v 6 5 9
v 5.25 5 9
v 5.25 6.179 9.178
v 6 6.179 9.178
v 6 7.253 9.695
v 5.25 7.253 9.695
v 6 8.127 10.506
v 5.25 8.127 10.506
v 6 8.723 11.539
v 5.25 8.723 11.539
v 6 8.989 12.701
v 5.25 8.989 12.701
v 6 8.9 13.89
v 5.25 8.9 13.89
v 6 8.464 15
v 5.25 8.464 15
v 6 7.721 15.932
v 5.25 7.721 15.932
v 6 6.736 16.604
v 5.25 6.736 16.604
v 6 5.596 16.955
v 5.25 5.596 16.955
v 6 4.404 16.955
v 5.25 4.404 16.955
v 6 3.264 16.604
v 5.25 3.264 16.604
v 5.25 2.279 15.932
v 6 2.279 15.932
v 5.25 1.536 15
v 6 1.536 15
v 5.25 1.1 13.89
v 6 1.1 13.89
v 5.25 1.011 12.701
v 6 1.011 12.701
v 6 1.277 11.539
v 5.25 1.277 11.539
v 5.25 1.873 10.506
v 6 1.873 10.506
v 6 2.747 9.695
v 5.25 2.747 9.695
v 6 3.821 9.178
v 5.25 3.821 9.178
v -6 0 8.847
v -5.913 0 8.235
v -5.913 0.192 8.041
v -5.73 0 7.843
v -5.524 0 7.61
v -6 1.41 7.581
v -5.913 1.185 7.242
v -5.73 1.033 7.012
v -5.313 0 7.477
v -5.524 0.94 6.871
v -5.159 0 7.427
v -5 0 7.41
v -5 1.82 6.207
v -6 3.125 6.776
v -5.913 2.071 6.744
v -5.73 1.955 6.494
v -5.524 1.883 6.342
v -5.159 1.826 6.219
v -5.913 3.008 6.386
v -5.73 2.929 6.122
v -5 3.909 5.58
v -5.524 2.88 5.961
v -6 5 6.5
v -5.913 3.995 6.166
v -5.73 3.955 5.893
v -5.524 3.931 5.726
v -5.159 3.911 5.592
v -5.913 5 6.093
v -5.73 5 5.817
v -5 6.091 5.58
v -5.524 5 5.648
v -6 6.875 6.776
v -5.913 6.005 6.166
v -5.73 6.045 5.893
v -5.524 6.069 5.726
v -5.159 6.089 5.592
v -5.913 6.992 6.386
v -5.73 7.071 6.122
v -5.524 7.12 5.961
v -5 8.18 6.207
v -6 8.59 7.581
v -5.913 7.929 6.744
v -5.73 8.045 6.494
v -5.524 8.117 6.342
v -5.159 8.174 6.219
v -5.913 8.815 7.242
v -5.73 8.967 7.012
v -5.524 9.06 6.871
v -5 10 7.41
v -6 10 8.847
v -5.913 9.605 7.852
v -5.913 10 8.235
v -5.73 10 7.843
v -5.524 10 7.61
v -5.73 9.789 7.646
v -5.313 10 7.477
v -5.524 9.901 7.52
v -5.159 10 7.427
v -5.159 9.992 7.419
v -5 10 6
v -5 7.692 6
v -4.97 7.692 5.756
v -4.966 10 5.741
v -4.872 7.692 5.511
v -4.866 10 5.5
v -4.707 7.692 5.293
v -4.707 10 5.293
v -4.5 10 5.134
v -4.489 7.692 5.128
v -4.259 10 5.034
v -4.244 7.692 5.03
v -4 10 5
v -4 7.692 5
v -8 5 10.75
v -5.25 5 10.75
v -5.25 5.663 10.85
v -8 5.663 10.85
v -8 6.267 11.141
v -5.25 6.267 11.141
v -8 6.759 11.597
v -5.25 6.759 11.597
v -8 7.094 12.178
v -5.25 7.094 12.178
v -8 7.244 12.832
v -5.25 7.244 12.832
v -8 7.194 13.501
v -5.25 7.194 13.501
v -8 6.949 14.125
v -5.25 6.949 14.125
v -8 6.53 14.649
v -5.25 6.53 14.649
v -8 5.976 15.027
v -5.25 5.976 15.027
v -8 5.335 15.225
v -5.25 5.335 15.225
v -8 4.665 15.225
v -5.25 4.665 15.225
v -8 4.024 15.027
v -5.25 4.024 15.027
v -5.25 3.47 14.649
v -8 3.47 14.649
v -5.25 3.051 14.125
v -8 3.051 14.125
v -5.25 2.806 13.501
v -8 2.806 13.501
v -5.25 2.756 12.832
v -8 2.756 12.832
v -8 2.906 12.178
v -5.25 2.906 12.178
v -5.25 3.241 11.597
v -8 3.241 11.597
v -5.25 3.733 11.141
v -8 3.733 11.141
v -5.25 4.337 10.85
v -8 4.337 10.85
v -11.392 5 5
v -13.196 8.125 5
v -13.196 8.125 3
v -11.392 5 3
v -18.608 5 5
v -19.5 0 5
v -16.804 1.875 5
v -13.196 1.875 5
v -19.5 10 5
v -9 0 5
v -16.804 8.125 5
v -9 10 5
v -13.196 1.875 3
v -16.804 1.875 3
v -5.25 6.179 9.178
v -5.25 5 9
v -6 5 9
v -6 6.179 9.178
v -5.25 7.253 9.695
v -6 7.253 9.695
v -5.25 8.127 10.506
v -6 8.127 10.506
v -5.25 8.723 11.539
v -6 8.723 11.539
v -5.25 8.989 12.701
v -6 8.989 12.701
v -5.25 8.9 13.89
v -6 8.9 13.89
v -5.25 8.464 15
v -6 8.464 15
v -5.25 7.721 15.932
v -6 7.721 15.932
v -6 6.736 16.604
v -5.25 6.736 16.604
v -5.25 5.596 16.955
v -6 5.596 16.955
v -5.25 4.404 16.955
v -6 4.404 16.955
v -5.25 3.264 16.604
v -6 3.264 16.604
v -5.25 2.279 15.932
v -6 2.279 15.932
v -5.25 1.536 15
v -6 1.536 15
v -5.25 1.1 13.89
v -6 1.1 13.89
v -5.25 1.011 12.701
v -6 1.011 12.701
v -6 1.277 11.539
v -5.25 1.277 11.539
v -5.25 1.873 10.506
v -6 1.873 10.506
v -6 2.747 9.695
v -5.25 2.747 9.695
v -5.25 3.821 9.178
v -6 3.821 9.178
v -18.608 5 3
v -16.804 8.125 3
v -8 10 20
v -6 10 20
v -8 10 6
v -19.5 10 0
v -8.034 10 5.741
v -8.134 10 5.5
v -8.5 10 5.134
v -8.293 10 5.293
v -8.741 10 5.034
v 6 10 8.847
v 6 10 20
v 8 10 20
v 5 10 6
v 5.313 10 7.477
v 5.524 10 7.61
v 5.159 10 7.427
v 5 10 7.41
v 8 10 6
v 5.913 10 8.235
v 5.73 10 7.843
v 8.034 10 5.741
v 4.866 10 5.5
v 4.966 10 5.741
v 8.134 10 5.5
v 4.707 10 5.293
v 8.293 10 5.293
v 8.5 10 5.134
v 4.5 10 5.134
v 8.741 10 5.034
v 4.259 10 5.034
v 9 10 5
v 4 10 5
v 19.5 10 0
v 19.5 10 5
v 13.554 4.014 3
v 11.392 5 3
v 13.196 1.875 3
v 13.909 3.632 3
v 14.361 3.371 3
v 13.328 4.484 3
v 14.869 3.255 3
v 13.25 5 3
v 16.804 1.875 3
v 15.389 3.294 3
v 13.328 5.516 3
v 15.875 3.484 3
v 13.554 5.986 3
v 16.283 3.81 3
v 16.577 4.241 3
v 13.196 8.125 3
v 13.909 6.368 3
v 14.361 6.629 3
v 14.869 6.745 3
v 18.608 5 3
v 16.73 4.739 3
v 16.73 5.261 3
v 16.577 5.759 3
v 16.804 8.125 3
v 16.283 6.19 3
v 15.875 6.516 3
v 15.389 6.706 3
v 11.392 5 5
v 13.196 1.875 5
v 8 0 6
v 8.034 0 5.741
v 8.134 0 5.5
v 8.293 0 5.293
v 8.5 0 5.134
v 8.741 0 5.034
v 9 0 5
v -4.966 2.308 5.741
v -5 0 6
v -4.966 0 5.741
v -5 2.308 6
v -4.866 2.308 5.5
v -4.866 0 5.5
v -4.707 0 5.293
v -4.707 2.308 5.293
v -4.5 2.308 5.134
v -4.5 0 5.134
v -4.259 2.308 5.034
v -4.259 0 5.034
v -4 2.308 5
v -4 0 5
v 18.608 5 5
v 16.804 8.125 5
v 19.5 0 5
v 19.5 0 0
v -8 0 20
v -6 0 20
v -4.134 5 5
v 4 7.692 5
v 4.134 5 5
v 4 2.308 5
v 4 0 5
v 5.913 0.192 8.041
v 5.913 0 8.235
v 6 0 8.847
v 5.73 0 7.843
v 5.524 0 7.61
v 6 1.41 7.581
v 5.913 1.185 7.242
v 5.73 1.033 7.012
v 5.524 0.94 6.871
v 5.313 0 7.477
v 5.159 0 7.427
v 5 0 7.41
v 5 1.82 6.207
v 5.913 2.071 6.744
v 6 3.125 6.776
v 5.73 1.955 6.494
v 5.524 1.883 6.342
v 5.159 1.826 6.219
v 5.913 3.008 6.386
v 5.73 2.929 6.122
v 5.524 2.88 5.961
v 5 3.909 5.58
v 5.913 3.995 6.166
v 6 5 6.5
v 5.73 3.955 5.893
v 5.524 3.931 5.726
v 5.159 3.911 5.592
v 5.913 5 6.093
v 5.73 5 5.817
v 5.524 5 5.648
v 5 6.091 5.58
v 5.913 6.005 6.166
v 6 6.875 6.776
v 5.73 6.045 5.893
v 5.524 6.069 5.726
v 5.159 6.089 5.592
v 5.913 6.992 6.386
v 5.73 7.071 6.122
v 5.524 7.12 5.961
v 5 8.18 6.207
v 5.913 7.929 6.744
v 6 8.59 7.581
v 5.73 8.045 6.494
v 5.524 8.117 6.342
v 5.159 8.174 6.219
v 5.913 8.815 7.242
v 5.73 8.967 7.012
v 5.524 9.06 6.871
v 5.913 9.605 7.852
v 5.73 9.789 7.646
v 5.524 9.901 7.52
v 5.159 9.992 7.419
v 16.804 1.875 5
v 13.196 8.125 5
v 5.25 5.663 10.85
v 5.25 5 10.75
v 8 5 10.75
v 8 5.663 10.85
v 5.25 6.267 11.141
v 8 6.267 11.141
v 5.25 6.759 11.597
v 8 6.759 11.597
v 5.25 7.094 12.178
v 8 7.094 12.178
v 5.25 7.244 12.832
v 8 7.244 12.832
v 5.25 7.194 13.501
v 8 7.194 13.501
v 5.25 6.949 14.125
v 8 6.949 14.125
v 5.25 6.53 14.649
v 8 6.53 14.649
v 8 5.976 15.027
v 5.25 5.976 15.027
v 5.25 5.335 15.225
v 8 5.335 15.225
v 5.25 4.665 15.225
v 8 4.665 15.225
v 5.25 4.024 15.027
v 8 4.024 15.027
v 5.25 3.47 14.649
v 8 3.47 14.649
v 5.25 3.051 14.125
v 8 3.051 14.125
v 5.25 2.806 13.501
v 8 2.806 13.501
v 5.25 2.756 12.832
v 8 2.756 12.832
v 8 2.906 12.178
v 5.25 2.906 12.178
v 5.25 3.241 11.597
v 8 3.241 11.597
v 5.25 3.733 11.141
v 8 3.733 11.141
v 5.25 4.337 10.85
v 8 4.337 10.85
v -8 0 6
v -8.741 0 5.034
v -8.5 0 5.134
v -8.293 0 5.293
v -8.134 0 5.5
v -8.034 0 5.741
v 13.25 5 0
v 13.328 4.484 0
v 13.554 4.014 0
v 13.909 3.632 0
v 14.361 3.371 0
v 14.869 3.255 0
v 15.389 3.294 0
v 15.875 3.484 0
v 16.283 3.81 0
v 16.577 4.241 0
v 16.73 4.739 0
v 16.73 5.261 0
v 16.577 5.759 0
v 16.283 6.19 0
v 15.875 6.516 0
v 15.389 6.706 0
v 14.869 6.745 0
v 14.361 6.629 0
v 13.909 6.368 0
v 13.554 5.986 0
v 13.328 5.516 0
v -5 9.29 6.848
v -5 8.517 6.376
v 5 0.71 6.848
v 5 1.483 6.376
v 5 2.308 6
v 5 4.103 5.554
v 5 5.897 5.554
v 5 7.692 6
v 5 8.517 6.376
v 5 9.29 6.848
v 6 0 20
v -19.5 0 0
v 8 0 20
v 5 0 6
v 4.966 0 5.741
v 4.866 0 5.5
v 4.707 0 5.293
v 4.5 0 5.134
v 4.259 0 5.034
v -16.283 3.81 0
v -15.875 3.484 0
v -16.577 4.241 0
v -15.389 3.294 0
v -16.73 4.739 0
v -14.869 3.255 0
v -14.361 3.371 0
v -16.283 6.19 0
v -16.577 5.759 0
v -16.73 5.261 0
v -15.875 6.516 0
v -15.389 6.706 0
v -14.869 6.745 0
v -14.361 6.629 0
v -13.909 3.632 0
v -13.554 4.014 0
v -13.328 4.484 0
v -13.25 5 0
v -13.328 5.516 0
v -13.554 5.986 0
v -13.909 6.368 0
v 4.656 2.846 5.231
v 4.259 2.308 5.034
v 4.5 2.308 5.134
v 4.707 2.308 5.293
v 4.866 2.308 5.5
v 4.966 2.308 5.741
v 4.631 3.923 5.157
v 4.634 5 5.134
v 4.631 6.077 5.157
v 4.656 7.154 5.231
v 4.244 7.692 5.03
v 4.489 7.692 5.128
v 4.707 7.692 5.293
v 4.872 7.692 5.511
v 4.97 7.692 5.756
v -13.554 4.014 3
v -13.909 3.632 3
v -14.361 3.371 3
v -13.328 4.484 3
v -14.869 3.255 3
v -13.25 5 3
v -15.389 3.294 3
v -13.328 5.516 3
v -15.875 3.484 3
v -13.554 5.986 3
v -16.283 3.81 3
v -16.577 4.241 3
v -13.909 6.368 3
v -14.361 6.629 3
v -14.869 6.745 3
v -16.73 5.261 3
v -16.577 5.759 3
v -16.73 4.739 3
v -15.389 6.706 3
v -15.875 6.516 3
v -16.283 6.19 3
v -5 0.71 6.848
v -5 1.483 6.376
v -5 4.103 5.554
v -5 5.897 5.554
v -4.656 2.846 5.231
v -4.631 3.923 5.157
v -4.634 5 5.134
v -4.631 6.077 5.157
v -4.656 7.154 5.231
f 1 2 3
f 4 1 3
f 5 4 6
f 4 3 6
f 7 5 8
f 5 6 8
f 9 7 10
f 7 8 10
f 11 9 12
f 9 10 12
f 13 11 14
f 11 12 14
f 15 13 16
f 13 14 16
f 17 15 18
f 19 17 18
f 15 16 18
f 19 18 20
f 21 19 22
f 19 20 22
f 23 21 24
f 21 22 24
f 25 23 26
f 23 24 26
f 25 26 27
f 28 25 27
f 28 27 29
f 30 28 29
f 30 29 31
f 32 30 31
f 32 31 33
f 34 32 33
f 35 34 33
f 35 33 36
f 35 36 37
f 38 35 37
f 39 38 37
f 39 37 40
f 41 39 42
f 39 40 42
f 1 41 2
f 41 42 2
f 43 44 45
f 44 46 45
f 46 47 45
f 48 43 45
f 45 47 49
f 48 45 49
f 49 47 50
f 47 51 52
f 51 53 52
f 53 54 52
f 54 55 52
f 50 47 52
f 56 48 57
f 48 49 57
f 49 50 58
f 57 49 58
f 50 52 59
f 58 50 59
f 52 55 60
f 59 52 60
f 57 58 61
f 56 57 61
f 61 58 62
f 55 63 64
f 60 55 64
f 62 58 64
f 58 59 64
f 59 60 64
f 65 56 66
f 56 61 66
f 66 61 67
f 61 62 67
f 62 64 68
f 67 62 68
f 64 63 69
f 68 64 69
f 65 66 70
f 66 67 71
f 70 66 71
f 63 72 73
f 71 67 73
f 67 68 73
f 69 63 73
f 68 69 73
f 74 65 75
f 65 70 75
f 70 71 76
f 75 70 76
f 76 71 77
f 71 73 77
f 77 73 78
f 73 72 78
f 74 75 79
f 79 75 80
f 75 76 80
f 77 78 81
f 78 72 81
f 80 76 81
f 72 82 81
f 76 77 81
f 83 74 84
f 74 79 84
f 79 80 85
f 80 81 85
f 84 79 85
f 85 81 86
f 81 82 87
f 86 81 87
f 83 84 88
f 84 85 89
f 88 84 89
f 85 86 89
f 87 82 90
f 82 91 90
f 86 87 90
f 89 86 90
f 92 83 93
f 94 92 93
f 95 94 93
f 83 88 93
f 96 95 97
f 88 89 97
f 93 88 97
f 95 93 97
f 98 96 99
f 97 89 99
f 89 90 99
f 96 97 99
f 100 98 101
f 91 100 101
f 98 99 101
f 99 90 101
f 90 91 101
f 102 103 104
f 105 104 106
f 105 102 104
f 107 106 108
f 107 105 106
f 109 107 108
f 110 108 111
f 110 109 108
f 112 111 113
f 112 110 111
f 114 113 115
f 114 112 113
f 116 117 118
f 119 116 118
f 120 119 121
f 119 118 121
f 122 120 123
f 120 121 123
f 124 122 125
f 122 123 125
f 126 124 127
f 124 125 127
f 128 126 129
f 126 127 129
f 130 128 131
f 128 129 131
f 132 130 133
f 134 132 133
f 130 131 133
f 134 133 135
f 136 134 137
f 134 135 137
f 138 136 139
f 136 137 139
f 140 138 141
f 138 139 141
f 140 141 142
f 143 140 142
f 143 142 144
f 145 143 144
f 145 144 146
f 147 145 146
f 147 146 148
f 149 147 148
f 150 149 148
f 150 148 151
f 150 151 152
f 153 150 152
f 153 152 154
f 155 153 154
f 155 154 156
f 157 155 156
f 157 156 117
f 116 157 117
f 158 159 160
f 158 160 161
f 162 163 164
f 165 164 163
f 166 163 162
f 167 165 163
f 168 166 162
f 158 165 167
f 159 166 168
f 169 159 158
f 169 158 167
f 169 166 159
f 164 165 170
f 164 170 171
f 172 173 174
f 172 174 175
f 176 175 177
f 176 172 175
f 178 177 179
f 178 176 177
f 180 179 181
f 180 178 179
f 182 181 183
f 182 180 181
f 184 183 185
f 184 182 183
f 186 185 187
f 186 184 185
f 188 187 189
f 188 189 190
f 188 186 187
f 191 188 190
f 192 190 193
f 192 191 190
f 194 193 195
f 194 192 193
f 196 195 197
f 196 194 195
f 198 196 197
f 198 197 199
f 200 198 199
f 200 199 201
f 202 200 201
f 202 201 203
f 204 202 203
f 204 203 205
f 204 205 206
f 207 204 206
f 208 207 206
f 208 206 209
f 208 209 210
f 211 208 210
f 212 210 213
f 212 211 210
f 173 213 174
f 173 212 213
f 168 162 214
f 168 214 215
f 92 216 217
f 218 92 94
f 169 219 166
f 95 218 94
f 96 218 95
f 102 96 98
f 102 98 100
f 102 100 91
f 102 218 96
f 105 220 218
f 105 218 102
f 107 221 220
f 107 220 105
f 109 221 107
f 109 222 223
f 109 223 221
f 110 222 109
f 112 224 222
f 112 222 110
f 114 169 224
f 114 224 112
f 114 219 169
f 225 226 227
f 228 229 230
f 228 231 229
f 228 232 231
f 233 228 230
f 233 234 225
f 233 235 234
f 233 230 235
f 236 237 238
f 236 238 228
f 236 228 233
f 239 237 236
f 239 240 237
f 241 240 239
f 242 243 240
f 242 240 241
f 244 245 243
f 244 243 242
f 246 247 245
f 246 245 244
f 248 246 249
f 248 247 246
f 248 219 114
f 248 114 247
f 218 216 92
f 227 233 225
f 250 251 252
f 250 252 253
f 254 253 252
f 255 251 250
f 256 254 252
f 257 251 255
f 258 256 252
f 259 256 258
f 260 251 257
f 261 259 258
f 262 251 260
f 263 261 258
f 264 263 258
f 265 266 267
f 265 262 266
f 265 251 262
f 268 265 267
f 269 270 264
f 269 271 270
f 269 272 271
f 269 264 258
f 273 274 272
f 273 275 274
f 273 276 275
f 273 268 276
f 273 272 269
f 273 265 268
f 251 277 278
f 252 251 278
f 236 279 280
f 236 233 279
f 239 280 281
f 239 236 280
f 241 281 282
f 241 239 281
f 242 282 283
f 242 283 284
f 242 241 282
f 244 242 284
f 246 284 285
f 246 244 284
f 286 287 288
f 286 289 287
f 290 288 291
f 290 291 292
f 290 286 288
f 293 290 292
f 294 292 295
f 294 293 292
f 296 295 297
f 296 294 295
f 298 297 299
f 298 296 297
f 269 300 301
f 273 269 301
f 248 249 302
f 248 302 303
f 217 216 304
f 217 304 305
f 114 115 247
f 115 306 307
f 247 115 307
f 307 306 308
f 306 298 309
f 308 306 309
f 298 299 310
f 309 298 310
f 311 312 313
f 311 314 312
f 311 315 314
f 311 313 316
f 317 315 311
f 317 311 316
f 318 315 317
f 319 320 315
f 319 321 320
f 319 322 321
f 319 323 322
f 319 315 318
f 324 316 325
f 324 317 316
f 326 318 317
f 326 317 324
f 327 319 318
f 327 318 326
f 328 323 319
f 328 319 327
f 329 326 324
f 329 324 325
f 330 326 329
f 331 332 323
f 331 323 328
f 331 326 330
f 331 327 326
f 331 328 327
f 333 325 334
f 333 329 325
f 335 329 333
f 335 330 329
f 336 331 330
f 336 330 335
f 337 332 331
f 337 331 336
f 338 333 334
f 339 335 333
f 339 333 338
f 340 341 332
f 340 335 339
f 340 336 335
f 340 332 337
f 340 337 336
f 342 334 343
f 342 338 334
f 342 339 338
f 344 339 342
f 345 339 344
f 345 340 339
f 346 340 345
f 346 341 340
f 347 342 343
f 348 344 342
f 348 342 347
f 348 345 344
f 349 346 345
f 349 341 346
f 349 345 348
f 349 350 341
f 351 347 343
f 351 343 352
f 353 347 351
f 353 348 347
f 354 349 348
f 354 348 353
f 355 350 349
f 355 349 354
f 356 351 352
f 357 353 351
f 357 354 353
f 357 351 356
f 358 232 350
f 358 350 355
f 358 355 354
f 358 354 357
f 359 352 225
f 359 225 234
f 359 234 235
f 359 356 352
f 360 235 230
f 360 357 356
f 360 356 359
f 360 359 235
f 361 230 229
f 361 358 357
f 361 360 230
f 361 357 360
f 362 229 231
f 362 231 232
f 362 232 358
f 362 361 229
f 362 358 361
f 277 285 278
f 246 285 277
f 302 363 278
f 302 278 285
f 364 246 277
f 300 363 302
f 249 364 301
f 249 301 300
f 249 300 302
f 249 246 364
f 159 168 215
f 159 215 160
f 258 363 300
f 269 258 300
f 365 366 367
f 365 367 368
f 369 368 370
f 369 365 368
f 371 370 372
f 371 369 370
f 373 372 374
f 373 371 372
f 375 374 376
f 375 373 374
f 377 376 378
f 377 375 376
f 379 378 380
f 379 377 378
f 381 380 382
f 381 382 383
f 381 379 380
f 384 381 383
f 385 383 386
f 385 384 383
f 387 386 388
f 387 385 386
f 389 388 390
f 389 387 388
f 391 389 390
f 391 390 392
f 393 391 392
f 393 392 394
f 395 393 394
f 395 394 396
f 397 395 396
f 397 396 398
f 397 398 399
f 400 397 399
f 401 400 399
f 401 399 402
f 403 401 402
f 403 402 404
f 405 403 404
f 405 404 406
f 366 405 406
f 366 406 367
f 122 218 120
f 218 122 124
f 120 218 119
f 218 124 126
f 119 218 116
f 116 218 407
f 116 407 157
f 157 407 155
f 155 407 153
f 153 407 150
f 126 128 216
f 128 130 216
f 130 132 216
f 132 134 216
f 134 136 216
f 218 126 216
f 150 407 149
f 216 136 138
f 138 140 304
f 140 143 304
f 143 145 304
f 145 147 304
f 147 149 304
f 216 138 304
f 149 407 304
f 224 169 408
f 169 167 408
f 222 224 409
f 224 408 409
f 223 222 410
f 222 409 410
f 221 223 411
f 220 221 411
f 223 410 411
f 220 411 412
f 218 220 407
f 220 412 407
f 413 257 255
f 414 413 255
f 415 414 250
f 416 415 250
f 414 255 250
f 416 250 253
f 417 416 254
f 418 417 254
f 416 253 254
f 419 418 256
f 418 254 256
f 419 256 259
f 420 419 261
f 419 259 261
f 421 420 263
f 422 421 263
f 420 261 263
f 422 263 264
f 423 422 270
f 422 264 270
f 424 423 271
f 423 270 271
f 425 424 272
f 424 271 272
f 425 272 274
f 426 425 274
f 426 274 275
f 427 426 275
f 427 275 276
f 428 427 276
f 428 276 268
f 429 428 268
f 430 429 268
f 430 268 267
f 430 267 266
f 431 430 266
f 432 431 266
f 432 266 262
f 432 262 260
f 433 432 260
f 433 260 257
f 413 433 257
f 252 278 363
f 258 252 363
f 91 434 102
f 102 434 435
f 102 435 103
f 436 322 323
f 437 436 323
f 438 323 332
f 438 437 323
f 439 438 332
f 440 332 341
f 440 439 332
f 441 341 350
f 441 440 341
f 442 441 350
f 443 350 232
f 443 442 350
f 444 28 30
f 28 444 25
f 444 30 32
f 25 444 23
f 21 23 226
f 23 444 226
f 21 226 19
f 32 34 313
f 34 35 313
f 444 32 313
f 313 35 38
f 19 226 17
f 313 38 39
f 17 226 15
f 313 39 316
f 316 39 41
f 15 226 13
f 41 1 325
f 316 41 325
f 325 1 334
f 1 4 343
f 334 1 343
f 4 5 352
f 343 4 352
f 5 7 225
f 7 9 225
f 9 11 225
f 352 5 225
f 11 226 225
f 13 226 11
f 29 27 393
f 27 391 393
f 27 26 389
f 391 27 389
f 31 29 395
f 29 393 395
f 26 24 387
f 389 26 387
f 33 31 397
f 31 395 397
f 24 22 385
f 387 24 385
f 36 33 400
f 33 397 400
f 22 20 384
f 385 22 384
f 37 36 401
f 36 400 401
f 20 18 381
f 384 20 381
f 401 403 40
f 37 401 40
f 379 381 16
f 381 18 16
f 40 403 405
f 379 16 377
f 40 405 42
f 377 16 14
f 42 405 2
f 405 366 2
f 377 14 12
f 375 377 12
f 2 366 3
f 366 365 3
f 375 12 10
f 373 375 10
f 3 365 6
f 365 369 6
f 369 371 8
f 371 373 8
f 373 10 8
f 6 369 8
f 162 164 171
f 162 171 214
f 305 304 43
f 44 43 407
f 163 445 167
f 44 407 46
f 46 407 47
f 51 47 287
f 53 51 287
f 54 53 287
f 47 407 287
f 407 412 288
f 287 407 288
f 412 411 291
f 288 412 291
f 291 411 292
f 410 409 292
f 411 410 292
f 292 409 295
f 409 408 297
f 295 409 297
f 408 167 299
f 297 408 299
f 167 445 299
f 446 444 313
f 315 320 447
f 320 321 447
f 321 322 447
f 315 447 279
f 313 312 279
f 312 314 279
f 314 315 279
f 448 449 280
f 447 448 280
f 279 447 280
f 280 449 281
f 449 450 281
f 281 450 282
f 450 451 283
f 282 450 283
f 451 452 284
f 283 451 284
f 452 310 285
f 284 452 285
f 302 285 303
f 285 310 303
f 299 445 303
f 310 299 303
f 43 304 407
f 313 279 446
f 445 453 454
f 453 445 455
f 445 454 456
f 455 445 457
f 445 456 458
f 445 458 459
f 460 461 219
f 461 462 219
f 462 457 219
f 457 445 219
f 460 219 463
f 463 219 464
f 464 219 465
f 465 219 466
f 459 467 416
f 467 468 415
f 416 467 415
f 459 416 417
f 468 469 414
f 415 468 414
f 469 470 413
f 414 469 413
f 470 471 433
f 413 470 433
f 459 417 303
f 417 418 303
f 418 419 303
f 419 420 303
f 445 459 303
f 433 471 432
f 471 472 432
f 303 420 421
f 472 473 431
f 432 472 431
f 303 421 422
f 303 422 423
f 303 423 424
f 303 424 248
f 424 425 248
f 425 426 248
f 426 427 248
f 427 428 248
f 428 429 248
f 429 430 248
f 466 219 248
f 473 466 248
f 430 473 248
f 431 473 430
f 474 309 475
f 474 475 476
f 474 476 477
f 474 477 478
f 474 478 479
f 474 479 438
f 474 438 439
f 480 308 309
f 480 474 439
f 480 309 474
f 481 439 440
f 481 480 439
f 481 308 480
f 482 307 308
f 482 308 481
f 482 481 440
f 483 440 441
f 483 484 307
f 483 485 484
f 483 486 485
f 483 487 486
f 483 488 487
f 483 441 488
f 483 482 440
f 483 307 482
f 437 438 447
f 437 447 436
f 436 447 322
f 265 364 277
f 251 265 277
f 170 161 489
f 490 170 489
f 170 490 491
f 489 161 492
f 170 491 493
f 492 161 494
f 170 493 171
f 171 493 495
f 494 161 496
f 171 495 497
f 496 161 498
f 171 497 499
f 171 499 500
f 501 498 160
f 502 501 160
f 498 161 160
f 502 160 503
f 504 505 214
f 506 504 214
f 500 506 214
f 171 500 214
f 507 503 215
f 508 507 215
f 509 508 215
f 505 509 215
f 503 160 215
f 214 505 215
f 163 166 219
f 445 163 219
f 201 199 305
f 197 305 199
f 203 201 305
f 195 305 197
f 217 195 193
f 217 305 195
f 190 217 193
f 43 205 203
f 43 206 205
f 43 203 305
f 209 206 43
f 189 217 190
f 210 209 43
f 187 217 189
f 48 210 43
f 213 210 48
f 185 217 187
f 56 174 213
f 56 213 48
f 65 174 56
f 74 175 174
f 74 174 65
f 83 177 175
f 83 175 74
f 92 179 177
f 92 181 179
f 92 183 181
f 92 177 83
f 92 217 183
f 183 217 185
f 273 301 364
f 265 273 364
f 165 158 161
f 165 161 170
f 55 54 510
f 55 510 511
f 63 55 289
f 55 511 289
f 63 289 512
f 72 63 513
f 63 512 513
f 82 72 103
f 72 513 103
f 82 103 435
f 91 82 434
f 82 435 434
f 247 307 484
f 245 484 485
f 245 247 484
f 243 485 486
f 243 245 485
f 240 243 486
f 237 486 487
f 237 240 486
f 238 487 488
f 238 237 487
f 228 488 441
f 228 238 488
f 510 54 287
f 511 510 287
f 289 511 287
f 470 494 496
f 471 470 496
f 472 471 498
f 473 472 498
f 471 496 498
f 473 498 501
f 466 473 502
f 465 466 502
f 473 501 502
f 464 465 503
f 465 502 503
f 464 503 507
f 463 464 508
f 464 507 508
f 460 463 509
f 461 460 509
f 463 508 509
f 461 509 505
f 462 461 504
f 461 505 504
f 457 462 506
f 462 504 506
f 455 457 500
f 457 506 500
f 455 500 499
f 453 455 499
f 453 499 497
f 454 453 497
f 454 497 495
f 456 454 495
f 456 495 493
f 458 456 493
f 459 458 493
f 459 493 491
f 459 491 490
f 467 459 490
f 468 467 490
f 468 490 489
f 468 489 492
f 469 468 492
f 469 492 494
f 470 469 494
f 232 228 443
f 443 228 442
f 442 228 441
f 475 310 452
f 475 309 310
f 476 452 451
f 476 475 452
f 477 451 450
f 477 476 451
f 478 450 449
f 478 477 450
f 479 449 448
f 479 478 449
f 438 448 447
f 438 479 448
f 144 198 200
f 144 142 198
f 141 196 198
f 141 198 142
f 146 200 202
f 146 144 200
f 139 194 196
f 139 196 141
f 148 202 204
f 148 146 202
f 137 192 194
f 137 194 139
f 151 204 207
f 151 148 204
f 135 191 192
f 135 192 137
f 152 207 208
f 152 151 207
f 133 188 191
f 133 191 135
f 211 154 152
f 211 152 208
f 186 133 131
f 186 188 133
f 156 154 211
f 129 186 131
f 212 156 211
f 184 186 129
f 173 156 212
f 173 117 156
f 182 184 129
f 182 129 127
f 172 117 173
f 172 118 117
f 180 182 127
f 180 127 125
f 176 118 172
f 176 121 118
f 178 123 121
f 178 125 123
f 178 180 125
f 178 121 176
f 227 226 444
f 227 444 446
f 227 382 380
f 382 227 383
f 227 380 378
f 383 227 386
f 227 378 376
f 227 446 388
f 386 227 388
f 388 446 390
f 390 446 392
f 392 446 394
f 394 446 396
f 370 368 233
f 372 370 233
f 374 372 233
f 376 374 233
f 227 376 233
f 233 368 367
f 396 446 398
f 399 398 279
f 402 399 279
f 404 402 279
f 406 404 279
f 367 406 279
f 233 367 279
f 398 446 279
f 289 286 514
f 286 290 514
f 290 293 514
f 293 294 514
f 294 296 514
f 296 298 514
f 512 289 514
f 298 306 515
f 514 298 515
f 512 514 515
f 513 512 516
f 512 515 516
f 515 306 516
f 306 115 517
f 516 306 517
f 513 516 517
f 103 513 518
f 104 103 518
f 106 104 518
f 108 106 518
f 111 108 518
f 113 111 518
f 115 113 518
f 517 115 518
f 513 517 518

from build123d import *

# Parameters (mm, degrees)
BOSS_EXTRUDE1_DEPTH = 10
SKETCH2_R           = 2.25
CUT_EXTRUDE1_DEPTH  = 28.49545417
SKETCH3_W           = 39
SKETCH3_H           = 5
BOSS_EXTRUDE2_DEPTH = 10
SKETCH4_R           = 1.75
CUT_EXTRUDE2_DEPTH  = 27.55654345
CUT_EXTRUDE3_DEPTH  = 1
BOSS_EXTRUDE3_START = 0.75
SKETCH5_R           = 4
SKETCH5_R_2         = 2.25
BOSS_EXTRUDE3_DEPTH = 0.75
FILLET1_R           = 1
SKETCH7_R           = 1.75
CUT_EXTRUDE4_DEPTH  = 2


with BuildPart() as part:
    # Sketch1 → Boss-Extrude1 (new body)
    with BuildSketch(Plane(origin=(0, 0, 0), x_dir=(1, 0, 0), z_dir=(0, 1, 0))):
        Polygon((8, 0), (0, 0), (0, -5), (5, -5), (5, -20), (8, -20), align=None)
        Polygon((0, -5), (0, 0), (-8, 0), (-8, -20), (-5, -20), (-5, -5), align=None)
    extrude(amount=BOSS_EXTRUDE1_DEPTH)

    # Sketch2 → Cut-Extrude1 (cut, through all)
    with BuildSketch(Plane(origin=(8, 0, 0), x_dir=(0, 0, -1), z_dir=(1, 0, 0))):
        with Locations((-13, 5)):
            Circle(SKETCH2_R)
    extrude(amount=-CUT_EXTRUDE1_DEPTH, mode=Mode.SUBTRACT)

    # Sketch3 → Boss-Extrude2 (add, through all)
    with BuildSketch(Plane(origin=(0, 10, 0), x_dir=(1, 0, 0), z_dir=(0, 1, 0))):
        with Locations((0, -2.5)):
            Rectangle(SKETCH3_W, SKETCH3_H)
    extrude(amount=-BOSS_EXTRUDE2_DEPTH)

    # Sketch4 → Cut-Extrude2 (cut, through all)
    with BuildSketch(Plane.XY.offset(5)):
        with Locations((-15, 5)):
            Circle(SKETCH4_R)
        with Locations(Location((15, 5, 0), (0, 0, 180))):
            Circle(SKETCH4_R)
    extrude(amount=-CUT_EXTRUDE2_DEPTH, mode=Mode.SUBTRACT)

    # Sketch6 → Cut-Extrude3 (cut)
    with BuildSketch(Plane(origin=(-5, 0, 0), x_dir=(0, 0, -1), z_dir=(1, 0, 0))):
        with BuildLine():
            Line((-13, 12.5), (-20.5, 12.5))
            Line((-20.5, 12.5), (-20.5, 5))
            Line((-20.5, 5), (-20.5, -2.5))
            Line((-20.5, -2.5), (-13, -2.5))
            ThreePointArc((-13, -2.5), (-5.5, 5), (-13, 12.5))
        make_face()
    cut_extrude3 = extrude(amount=-CUT_EXTRUDE3_DEPTH, mode=Mode.SUBTRACT)

    # Sketch5 → Boss-Extrude3 (add)
    with BuildSketch(Plane(origin=(-6, 0, 0), x_dir=(0, 0, -1), z_dir=(1, 0, 0)).offset(BOSS_EXTRUDE3_START)):
        with Locations((-13, 5)):
            Circle(SKETCH5_R)
        with Locations((-13, 5)):
            Circle(SKETCH5_R_2, mode=Mode.SUBTRACT)
    boss_extrude3 = extrude(amount=-BOSS_EXTRUDE3_DEPTH)

    # Mirror1: Cut-Extrude3, Boss-Extrude3 across plane
    add(cut_extrude3.mirror(Plane(origin=(0, 0, 0), x_dir=(0, 0, 1), z_dir=(1, 0, 0))), mode=Mode.SUBTRACT)
    add(boss_extrude3.mirror(Plane(origin=(0, 0, 0), x_dir=(0, 0, 1), z_dir=(1, 0, 0))))

    # Fillet1
    fillet1_edges = [part.edges().sort_by_distance(p)[0] for p in [
        (-6, 5, 5.5),
        (6, 5, 5.5),
        (5, 5, 5),
        (-5, 5, 5),
        (8, 5, 5),
        (-8, 5, 5),
    ]]
    fillet(fillet1_edges, radius=FILLET1_R - 0.0001)  # a hair under: the kernel refuses the full size

    # Sketch7 → Cut-Extrude4 (cut)
    # profile 1 of 3: a face of its own
    with BuildSketch(Plane.XY.offset(5)):
        Polygon((-16.804219591, 8.125), (-13.195780409, 8.125), (-11.391560818, 5), (-13.195780409, 1.875), (-16.804219591, 1.875), (-18.608439182, 5), align=None)
    # profile 2 of 3: a face of its own
    with BuildSketch(Plane.XY.offset(5)):
        Polygon((16.804219591, 1.875), (18.608439182, 5), (16.804219591, 8.125), (13.195780409, 8.125), (11.391560818, 5), (13.195780409, 1.875), align=None)
        with Locations((15, 5)):
            Circle(SKETCH7_R, mode=Mode.SUBTRACT)
    # profile 3 of 3: a face of its own
    with BuildSketch(Plane.XY.offset(5)):
        with Locations((15, 5)):
            Circle(SKETCH7_R)
    extrude(amount=-CUT_EXTRUDE4_DEPTH, mode=Mode.SUBTRACT)


solid = part.part
